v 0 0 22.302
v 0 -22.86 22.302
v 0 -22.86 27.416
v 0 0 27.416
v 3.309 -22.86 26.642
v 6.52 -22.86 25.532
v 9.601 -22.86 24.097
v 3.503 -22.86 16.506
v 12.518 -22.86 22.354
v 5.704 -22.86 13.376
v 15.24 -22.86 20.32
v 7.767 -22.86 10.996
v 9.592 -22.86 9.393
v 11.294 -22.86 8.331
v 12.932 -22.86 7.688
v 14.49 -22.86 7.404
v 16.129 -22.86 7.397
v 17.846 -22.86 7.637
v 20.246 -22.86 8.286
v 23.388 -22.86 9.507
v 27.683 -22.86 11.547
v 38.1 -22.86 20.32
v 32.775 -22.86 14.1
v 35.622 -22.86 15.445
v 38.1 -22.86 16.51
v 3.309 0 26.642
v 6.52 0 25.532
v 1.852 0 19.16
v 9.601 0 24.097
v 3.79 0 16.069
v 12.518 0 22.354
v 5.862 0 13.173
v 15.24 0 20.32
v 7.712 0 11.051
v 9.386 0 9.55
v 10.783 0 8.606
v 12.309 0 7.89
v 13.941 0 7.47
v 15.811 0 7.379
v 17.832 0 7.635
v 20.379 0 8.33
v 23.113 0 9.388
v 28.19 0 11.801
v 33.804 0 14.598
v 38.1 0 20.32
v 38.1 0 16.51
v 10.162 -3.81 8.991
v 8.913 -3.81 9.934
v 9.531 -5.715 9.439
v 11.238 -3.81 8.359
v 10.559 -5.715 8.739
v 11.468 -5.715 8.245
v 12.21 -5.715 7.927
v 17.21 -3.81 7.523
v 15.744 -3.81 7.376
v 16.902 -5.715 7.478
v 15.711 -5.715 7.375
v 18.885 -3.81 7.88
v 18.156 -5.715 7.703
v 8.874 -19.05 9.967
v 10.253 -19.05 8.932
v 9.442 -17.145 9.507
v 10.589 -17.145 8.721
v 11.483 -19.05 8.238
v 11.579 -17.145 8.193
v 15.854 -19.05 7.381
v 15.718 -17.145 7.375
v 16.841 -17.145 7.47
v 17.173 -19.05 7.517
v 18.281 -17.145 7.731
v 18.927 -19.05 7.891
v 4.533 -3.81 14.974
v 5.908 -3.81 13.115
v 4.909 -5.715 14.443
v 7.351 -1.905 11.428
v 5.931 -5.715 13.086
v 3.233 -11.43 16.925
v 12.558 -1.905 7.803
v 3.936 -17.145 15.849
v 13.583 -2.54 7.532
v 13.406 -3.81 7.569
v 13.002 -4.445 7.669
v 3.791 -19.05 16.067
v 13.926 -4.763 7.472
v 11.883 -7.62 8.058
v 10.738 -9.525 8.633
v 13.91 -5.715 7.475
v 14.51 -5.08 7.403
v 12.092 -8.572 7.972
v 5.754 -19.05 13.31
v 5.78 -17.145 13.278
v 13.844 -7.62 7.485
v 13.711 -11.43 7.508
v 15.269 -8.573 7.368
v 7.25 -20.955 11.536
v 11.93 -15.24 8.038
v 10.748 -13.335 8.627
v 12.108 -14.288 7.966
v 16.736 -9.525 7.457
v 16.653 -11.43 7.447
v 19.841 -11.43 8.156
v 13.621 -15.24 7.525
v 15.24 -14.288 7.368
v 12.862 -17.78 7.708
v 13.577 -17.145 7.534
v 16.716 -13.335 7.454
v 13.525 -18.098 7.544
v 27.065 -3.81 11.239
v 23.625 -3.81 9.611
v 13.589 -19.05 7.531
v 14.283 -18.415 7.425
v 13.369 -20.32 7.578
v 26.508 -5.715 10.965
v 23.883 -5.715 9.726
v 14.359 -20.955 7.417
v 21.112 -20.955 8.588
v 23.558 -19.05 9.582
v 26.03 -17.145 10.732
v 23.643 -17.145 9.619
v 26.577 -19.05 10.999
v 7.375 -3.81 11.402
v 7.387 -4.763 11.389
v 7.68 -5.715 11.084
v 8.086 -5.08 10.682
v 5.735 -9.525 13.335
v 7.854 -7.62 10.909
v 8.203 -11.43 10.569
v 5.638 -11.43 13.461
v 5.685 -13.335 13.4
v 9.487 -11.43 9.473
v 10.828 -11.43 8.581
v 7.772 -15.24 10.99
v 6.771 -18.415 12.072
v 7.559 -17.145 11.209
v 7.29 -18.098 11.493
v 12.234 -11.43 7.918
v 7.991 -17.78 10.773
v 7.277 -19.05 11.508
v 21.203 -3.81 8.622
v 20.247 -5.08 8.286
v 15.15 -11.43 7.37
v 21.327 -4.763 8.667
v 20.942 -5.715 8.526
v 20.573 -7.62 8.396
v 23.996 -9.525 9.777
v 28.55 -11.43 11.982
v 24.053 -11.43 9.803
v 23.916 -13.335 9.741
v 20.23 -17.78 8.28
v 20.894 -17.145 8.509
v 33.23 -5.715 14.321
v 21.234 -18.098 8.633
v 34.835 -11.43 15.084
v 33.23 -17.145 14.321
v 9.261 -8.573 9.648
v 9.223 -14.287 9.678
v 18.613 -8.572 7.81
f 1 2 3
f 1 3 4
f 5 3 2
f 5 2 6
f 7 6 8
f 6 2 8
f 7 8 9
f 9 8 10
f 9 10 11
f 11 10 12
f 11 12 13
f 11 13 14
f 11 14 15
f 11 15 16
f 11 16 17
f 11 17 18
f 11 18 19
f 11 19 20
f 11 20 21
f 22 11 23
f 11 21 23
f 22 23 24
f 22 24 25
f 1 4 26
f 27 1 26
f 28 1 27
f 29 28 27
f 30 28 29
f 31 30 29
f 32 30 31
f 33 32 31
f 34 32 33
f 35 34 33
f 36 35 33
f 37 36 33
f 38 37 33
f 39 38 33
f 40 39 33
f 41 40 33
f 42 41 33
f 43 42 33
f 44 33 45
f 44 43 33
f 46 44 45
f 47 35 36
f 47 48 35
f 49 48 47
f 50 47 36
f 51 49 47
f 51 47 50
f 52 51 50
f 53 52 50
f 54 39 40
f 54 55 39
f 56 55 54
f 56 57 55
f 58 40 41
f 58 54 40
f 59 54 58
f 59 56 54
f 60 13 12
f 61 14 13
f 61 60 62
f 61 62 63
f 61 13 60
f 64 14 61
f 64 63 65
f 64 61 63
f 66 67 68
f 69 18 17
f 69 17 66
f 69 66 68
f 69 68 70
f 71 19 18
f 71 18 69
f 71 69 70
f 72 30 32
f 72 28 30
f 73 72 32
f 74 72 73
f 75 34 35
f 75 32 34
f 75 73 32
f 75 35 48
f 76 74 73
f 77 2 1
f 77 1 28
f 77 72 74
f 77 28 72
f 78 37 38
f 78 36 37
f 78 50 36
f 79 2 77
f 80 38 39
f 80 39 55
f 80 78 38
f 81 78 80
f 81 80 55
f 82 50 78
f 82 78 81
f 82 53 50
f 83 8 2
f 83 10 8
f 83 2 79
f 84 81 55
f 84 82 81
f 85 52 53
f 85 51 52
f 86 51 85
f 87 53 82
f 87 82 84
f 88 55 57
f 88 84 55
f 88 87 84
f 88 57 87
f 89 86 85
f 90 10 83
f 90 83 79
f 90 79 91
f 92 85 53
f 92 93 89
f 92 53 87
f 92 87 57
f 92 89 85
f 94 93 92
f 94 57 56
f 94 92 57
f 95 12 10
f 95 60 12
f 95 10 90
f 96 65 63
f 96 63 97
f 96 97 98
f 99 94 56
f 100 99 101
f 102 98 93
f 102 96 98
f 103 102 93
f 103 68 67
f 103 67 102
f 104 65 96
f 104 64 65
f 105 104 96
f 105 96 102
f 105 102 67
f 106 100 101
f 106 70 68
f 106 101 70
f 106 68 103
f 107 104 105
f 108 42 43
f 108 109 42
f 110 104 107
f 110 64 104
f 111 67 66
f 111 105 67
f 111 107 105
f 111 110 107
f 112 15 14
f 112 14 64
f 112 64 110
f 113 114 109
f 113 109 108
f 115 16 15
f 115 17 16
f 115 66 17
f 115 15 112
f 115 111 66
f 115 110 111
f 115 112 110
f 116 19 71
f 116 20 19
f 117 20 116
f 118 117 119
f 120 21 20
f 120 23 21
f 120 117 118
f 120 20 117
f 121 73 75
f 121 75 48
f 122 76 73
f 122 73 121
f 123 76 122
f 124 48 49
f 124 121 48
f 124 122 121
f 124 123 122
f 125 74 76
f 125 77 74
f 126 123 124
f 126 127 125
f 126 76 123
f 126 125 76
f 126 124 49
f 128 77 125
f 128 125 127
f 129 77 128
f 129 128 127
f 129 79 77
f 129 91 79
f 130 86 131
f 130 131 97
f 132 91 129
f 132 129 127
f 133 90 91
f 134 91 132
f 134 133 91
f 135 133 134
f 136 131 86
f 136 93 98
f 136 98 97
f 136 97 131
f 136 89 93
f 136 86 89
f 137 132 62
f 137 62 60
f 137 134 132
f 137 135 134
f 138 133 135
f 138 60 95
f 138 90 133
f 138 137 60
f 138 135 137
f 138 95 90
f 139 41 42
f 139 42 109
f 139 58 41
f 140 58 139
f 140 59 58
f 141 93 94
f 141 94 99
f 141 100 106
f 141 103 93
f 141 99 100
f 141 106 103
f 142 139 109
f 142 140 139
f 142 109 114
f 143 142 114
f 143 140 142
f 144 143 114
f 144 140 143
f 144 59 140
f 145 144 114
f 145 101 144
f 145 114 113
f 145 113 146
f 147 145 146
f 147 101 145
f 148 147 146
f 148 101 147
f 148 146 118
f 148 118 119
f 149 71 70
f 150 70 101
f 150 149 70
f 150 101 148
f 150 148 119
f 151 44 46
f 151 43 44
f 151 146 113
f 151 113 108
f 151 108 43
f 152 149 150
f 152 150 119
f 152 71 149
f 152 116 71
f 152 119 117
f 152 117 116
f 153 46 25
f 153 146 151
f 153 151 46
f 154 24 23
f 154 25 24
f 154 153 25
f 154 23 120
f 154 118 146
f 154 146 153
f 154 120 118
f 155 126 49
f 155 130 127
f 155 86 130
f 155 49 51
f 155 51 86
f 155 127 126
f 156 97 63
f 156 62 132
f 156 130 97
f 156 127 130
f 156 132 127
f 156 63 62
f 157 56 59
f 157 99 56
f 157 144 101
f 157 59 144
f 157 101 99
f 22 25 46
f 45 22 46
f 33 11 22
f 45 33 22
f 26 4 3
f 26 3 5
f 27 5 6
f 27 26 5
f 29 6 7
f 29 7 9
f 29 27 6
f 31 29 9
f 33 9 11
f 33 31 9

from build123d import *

# Parameters (mm, degrees)
F0_W        = 38.1
F0_H        = 22.86
F1_DEPTH    = 33.02
F4_DEPTH    = 25.4
F5_T1_DEPTH = 128.3541230591


# Not quite as in the source:
# - a fillet or chamfer that OpenCascade refuses, or shapes differently, is made with other operations: its cross-section is extruded or revolved along the edge and cut away or added


with BuildPart() as f1:
    # F0 (on Top) → F1 (new body)
    with BuildSketch(Plane.XY):
        with Locations((19.05, -11.43)):
            Rectangle(F0_W, F0_H)
    extrude(amount=F1_DEPTH)

    # F3 (on face) → F4 (cut)
    with BuildSketch(Plane.XZ.offset(22.86)):
        with BuildLine():
            Line((0, 22.3022773862), (0, 0))
            Line((0, 0), (38.1, 0))
            Line((38.1, 0), (38.1, 16.51))
            add(Edge.make_bspline(
                [(0, 22.3022773862), (4.0173555015, 15.4189654394), (12.5954888388, 0.7212450957), (28.7387394496, 12.7226787633), (38.1, 16.51)],
                knots=[0, 0, 0, 0, 0.2888963968, 0.6168714248, 0.6168714248, 0.6168714248, 0.6168714248], degree=3))
        make_face()
        Polygon((0, 33.02), (0, 27.94), (15.24, 27.94), (15.24, 20.32), (38.1, 20.32), (38.1, 33.02), align=None)
    extrude(amount=-F4_DEPTH, mode=Mode.SUBTRACT)

    # F5: fillet of radius 33.02 on 1 edges, made by hand

    # F5_s2 → F5_t1 (cut)
    with BuildSketch(Plane.XZ.offset(-52.7470615295)):
        with BuildLine():
            ThreePointArc((-5.8588246118, 27.94), (5.3575116884, 25.976628922), (15.24, 20.32))
            Line((15.24, 20.32), (15.24, 27.94))
            Line((15.24, 27.94), (-5.8588246118, 27.94))
        make_face()
    extrude(amount=F5_T1_DEPTH, mode=Mode.SUBTRACT)


solid = f1.part
